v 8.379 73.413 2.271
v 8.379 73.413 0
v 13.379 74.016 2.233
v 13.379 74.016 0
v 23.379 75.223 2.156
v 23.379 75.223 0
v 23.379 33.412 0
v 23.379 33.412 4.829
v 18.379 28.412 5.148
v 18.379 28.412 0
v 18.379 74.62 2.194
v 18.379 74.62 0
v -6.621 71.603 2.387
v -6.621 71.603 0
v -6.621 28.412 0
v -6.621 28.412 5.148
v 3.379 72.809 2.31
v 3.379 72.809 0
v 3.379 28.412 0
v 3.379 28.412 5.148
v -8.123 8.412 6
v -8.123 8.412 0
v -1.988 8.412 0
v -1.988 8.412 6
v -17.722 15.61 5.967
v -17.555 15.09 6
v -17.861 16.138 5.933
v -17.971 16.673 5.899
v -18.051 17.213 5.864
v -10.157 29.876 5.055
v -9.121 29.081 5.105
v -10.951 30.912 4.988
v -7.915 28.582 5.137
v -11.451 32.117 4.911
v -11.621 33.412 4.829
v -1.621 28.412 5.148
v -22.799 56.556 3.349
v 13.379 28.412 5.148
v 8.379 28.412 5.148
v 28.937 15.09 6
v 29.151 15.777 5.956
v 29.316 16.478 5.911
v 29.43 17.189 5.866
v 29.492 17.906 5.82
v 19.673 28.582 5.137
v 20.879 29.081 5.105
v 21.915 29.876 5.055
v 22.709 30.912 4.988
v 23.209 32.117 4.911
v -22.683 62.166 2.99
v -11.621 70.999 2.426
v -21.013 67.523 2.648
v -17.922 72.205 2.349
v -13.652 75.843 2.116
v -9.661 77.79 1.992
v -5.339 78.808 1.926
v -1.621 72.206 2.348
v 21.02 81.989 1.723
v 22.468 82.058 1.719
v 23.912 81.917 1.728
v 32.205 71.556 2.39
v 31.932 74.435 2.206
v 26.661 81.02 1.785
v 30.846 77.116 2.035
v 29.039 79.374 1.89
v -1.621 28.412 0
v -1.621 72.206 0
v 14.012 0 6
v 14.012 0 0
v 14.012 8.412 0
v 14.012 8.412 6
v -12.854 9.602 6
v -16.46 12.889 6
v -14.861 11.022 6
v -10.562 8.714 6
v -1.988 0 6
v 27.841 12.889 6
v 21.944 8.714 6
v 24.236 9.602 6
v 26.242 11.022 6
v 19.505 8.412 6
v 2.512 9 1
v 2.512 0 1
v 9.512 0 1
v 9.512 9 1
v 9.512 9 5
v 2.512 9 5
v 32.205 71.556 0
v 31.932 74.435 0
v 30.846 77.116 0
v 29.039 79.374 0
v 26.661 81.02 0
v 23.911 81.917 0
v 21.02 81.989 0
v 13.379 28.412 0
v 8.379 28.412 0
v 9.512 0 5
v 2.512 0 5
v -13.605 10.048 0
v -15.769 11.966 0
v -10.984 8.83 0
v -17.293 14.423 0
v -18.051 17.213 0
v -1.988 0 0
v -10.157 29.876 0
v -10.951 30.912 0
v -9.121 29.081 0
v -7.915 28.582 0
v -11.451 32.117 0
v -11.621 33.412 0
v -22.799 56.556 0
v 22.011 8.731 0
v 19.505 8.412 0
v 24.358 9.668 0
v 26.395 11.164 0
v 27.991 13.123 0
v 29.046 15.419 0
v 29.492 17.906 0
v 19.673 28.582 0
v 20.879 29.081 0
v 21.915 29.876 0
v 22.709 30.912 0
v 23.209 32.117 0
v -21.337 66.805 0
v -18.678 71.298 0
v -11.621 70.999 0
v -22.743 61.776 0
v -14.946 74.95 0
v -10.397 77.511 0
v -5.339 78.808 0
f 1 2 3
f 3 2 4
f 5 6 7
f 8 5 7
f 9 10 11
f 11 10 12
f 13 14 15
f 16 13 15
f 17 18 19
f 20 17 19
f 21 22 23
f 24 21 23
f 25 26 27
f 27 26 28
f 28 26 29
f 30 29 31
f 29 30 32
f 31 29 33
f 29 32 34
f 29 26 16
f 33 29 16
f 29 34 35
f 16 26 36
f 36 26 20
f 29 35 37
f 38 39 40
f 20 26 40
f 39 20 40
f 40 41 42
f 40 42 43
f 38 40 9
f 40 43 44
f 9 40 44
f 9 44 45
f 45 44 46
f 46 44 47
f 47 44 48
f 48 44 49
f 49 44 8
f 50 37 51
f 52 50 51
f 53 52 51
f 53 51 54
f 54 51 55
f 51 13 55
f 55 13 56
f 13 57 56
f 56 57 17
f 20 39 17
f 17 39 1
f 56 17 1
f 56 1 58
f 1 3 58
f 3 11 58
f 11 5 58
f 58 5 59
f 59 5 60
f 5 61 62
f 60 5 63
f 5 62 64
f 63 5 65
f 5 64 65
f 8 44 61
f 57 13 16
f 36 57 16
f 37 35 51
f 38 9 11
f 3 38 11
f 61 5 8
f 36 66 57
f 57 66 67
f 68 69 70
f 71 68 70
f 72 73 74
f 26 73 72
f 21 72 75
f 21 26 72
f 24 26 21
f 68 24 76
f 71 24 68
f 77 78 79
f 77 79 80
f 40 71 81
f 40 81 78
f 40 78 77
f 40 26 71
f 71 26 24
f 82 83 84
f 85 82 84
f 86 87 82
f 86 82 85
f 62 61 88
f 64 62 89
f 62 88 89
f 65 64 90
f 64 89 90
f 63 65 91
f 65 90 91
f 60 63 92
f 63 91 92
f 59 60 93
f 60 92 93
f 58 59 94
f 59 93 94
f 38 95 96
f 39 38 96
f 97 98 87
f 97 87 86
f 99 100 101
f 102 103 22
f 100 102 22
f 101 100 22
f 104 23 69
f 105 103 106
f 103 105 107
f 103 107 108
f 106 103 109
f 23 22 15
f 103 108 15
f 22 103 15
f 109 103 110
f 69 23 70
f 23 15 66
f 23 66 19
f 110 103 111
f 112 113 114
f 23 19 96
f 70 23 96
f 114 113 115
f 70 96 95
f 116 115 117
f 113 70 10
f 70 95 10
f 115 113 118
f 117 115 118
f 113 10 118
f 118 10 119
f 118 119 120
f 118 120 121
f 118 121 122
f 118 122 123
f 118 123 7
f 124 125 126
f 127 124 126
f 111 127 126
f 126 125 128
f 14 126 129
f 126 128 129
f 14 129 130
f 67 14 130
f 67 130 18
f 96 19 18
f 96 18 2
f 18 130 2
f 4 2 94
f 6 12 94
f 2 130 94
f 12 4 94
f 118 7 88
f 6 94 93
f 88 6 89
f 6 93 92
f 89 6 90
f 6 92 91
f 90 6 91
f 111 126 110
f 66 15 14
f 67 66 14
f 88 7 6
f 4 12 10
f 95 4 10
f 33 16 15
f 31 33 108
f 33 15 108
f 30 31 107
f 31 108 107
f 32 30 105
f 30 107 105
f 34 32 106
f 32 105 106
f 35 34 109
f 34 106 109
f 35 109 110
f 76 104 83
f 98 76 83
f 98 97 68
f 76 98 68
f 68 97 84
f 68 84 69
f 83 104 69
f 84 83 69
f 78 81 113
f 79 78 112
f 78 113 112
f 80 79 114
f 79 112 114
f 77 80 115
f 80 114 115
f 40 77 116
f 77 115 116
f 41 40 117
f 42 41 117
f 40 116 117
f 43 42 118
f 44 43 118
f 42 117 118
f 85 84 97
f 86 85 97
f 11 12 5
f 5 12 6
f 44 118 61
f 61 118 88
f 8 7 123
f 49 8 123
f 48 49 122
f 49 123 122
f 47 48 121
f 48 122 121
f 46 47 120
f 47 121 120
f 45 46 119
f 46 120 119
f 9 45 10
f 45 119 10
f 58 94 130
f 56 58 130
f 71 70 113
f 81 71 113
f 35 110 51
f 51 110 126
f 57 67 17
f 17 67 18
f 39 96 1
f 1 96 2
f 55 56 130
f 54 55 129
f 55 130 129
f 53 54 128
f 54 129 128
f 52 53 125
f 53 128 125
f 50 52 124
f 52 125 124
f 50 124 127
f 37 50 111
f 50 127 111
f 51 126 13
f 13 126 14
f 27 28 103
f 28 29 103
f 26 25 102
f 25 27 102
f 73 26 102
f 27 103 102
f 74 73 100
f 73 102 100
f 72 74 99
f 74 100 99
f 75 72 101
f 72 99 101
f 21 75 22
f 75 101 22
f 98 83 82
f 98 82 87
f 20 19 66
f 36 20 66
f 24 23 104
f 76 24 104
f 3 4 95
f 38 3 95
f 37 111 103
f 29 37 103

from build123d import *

# Parameters (mm, degrees)
F1_DEPTH      = 6
F3_DEPTH      = 32.218832
F3_DEPTH_BACK = 22.944034
F4_W          = 7
F4_H          = 4
F5_DEPTH      = 9


with BuildPart() as f1:
    # F0 (on Top) → F1 (new body)
    with BuildSketch(Plane.XY):
        with BuildLine():
            Line((-1.988453, 8.411565), (-1.988453, 0))
            Line((-1.988453, 0), (14.011547, 0))
            Line((14.011547, 0), (14.011547, 8.411565))
            Line((14.011547, 8.411565), (19.504514, 8.411565))
            ThreePointArc((19.504514, 8.411565), (26.394687, 11.164117), (29.491749, 17.906464))
            Line((29.491749, 17.906464), (32.205068, 71.556178))
            ThreePointArc((32.205068, 71.556178), (29.038679, 79.374011), (21.019631, 81.989235))
            Line((21.019631, 81.989235), (-5.339437, 78.807969))
            ThreePointArc((-5.339437, 78.807969), (-18.677797, 71.297794), (-22.798946, 56.555653))
            Line((-22.798946, 56.555653), (-18.050739, 17.213364))
            ThreePointArc((-18.050739, 17.213364), (-14.75671, 10.928852), (-8.122783, 8.411565))
            Line((-8.122783, 8.411565), (-1.988453, 8.411565))
        make_face()
        with BuildLine():
            Line((-11.620977, 33.411565), (-11.620977, 70.999055))
            Line((-11.620977, 70.999055), (-6.620977, 71.602503))
            Line((-6.620977, 71.602503), (-6.620977, 28.411565))
            ThreePointArc((-6.620977, 28.411565), (-10.15651, 29.876032), (-11.620977, 33.411565))
        make_face(mode=Mode.SUBTRACT)
        Polygon((-1.620977, 28.411565), (-1.620977, 72.205952), (3.379023, 72.8094), (3.379023, 28.411565), align=None, mode=Mode.SUBTRACT)
        Polygon((8.379023, 73.412848), (13.379023, 74.016297), (13.379023, 28.411565), (8.379023, 28.411565), align=None, mode=Mode.SUBTRACT)
        with BuildLine():
            Line((23.379023, 75.223193), (23.379023, 33.411565))
            ThreePointArc((23.379023, 33.411565), (21.914557, 29.876032), (18.379023, 28.411565))
            Line((18.379023, 28.411565), (18.379023, 74.619745))
            Line((18.379023, 74.619745), (23.379023, 75.223193))
        make_face(mode=Mode.SUBTRACT)
    extrude(amount=F1_DEPTH)

    # F2 (on Right) → F3 (cut, two sides)
    with BuildSketch(Plane.YZ) as f3_sk:
        Polygon((82.888745, 7.075289), (8.152761, 6.443492), (82.888745, 1.665537), align=None)
    extrude(amount=F3_DEPTH, mode=Mode.SUBTRACT)
    extrude(f3_sk.sketch, amount=-F3_DEPTH_BACK, mode=Mode.SUBTRACT)

    # F4 (on face) → F5 (cut)
    with BuildSketch(Plane.XZ):
        with Locations((6.011547, 3)):
            Rectangle(F4_W, F4_H)
    extrude(amount=-F5_DEPTH, mode=Mode.SUBTRACT)


solid = f1.part
